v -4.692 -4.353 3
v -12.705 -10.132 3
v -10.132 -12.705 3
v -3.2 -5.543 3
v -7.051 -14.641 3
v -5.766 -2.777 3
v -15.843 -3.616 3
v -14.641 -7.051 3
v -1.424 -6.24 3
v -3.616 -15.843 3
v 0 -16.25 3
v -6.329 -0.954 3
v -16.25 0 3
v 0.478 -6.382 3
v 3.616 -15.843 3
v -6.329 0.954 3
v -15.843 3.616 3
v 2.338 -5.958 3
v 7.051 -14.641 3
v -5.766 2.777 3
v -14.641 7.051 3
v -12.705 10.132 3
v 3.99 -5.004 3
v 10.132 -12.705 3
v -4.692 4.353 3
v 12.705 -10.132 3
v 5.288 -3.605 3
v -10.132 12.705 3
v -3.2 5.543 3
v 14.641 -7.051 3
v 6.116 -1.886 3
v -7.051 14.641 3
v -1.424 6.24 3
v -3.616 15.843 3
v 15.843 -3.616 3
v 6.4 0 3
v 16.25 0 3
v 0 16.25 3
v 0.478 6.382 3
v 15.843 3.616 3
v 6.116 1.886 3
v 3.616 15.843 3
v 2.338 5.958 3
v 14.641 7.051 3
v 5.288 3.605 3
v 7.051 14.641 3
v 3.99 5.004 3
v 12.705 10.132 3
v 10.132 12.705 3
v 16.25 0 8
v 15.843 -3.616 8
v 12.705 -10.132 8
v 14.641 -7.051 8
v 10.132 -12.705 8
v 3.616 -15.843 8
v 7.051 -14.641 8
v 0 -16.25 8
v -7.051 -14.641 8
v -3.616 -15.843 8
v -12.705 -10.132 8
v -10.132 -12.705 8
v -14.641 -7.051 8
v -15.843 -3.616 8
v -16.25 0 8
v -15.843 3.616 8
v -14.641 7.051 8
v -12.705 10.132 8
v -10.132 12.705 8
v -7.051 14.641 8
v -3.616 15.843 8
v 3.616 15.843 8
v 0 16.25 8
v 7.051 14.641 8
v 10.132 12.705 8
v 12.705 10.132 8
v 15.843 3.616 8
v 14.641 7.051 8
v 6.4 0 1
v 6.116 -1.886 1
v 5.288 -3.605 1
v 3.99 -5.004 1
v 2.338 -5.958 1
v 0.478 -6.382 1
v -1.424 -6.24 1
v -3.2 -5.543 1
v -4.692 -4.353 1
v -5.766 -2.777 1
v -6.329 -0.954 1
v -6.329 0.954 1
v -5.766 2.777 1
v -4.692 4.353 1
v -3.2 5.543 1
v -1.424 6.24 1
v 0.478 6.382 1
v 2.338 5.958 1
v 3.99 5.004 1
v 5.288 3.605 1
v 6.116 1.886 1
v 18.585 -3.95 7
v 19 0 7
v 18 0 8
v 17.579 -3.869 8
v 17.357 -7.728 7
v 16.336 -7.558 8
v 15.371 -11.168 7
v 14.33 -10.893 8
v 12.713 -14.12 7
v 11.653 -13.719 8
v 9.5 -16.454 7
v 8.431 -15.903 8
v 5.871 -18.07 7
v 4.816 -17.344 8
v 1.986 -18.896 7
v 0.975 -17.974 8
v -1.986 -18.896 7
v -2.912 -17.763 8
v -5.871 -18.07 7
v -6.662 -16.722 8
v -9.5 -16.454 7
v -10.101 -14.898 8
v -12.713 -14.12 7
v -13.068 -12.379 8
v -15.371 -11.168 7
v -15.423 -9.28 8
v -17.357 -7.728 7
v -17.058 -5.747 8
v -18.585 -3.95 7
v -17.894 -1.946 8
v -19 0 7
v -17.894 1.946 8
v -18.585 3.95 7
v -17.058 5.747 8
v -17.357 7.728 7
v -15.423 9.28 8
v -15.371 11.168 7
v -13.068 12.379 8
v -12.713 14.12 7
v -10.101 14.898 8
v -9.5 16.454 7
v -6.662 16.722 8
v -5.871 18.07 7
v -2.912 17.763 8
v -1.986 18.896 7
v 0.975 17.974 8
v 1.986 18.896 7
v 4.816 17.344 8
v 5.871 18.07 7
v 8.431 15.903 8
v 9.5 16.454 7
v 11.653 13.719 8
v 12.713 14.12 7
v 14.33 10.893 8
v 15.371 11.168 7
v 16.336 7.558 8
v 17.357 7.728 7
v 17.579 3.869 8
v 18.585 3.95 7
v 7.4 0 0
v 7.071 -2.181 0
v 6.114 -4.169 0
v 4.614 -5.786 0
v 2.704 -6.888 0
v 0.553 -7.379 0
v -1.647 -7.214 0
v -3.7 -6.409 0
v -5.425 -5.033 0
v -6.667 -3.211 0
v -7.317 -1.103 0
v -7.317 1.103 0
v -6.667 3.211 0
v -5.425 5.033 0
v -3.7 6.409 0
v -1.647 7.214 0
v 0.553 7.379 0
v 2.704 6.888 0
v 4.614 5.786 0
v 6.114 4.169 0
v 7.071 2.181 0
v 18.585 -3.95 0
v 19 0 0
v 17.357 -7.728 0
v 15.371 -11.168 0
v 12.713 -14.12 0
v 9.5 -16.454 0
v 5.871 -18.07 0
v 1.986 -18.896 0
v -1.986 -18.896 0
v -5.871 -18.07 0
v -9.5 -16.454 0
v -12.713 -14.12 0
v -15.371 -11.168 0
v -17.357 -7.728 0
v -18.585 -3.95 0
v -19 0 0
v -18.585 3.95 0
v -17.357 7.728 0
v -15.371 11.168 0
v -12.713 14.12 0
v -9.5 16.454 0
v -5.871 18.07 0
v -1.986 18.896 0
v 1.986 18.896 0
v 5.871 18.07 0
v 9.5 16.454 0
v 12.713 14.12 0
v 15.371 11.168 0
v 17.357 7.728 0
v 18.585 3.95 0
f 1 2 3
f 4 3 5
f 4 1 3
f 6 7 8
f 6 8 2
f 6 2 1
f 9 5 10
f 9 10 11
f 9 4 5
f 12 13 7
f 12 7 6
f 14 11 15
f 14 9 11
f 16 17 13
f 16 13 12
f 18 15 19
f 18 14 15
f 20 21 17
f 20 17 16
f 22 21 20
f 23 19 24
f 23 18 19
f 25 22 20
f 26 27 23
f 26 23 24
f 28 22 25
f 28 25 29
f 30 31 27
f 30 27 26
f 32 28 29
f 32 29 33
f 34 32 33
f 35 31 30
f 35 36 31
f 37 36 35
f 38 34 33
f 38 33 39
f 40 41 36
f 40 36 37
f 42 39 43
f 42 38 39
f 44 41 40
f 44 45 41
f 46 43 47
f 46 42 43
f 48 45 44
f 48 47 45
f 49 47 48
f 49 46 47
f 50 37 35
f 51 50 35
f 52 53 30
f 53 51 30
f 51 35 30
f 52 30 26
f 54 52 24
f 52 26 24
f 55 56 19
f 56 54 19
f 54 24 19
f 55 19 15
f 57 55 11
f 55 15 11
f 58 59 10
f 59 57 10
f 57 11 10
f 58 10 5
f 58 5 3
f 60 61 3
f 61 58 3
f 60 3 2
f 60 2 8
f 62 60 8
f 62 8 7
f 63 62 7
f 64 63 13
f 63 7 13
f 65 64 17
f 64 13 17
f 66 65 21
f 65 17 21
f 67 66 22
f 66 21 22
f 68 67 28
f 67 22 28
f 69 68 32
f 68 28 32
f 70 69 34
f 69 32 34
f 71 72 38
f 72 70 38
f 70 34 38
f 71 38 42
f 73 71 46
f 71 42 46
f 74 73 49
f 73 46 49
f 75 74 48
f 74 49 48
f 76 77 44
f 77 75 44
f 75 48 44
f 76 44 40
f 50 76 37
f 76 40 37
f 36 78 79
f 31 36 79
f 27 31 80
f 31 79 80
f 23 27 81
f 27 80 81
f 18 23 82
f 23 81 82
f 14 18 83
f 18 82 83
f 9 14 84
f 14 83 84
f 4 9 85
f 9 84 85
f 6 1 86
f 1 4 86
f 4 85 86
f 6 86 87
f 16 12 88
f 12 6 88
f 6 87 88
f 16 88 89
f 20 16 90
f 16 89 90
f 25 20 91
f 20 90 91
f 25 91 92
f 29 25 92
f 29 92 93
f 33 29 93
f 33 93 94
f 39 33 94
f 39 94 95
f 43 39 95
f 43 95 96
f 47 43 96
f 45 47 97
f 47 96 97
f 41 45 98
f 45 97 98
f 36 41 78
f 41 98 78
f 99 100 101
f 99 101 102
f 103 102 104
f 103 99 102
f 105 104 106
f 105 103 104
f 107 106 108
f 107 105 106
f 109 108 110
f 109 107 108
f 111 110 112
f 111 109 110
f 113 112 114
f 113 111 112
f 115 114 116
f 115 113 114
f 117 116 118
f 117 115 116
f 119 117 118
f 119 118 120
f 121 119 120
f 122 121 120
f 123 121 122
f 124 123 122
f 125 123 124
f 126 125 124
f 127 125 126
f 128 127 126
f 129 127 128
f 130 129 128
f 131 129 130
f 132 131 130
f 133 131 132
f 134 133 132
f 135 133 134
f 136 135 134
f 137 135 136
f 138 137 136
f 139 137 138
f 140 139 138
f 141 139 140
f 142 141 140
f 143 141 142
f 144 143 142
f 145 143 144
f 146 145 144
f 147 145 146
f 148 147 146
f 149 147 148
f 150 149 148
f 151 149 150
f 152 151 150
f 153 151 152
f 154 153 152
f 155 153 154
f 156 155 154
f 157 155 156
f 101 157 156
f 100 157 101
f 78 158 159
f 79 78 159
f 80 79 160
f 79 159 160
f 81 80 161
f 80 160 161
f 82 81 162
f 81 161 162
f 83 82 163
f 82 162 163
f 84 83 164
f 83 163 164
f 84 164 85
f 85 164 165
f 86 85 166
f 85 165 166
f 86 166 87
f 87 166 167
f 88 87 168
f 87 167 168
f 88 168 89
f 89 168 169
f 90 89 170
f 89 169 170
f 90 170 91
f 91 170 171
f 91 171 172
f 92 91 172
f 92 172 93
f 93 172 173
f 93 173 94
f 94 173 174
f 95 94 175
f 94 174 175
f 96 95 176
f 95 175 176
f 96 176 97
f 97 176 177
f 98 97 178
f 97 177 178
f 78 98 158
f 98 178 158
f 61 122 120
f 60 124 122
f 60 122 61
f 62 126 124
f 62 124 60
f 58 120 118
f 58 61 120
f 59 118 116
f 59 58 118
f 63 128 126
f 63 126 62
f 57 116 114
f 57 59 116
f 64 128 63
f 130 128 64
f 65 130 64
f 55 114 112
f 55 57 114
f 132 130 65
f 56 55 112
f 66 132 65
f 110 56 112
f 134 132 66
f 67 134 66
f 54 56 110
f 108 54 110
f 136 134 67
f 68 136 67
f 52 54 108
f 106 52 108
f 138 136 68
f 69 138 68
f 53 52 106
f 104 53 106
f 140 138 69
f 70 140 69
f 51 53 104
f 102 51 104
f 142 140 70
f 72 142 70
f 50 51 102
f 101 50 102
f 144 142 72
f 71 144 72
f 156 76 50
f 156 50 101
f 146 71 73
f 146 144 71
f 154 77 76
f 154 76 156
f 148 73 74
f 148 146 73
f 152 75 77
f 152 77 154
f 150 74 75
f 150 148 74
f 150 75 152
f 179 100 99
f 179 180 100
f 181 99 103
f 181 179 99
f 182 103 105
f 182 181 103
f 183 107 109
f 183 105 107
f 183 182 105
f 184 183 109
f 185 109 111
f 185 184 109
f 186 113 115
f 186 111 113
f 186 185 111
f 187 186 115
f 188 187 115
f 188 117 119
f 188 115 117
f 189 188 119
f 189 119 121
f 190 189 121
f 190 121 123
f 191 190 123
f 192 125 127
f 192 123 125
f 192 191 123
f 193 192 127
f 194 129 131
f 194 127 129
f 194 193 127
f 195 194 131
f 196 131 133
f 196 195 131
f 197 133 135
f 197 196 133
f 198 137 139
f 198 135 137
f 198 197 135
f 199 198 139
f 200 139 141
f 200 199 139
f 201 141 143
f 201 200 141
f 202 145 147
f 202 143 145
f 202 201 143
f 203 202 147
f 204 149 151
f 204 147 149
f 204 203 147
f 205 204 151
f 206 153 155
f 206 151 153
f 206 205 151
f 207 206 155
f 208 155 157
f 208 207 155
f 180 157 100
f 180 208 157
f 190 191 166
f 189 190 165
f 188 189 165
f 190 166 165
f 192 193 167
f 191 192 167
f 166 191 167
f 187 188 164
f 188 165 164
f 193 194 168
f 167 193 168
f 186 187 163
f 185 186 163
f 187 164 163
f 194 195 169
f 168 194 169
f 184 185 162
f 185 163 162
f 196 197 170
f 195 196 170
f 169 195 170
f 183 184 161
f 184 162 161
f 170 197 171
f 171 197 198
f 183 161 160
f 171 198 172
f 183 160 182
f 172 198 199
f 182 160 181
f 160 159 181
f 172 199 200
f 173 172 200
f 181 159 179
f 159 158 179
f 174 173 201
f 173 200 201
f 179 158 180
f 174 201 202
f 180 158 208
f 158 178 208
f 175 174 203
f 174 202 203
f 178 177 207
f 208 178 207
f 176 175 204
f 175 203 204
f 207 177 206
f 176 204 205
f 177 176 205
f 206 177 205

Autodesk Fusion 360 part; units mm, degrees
sketch "Sketch1" plane through (0, 0, 0) normal (0, 0, 1) x (1, 0, 0)
  circle A0 centre (0, 0) radius 16.25
  circle A1 centre (0, 0) radius 19
  circle A2 centre (0, 0) radius 6.4
  dimension "d1" = 32.5
  dimension "d2" = 38
  dimension "d3" = 12.8
extrude "Extrude1" add sketch "Sketch1" along normal blind 8 contours A1
extrude "Extrude2" add sketch "Sketch1" along normal blind 3 contours A0
chamfer "Chamfer1" distance 1 angle 45 1 edges at (-17.7142, -6.8707, 8)
chamfer "Chamfer2" distance 1 angle 45 1 edges at (-5.9669, 2.3143, 0)
